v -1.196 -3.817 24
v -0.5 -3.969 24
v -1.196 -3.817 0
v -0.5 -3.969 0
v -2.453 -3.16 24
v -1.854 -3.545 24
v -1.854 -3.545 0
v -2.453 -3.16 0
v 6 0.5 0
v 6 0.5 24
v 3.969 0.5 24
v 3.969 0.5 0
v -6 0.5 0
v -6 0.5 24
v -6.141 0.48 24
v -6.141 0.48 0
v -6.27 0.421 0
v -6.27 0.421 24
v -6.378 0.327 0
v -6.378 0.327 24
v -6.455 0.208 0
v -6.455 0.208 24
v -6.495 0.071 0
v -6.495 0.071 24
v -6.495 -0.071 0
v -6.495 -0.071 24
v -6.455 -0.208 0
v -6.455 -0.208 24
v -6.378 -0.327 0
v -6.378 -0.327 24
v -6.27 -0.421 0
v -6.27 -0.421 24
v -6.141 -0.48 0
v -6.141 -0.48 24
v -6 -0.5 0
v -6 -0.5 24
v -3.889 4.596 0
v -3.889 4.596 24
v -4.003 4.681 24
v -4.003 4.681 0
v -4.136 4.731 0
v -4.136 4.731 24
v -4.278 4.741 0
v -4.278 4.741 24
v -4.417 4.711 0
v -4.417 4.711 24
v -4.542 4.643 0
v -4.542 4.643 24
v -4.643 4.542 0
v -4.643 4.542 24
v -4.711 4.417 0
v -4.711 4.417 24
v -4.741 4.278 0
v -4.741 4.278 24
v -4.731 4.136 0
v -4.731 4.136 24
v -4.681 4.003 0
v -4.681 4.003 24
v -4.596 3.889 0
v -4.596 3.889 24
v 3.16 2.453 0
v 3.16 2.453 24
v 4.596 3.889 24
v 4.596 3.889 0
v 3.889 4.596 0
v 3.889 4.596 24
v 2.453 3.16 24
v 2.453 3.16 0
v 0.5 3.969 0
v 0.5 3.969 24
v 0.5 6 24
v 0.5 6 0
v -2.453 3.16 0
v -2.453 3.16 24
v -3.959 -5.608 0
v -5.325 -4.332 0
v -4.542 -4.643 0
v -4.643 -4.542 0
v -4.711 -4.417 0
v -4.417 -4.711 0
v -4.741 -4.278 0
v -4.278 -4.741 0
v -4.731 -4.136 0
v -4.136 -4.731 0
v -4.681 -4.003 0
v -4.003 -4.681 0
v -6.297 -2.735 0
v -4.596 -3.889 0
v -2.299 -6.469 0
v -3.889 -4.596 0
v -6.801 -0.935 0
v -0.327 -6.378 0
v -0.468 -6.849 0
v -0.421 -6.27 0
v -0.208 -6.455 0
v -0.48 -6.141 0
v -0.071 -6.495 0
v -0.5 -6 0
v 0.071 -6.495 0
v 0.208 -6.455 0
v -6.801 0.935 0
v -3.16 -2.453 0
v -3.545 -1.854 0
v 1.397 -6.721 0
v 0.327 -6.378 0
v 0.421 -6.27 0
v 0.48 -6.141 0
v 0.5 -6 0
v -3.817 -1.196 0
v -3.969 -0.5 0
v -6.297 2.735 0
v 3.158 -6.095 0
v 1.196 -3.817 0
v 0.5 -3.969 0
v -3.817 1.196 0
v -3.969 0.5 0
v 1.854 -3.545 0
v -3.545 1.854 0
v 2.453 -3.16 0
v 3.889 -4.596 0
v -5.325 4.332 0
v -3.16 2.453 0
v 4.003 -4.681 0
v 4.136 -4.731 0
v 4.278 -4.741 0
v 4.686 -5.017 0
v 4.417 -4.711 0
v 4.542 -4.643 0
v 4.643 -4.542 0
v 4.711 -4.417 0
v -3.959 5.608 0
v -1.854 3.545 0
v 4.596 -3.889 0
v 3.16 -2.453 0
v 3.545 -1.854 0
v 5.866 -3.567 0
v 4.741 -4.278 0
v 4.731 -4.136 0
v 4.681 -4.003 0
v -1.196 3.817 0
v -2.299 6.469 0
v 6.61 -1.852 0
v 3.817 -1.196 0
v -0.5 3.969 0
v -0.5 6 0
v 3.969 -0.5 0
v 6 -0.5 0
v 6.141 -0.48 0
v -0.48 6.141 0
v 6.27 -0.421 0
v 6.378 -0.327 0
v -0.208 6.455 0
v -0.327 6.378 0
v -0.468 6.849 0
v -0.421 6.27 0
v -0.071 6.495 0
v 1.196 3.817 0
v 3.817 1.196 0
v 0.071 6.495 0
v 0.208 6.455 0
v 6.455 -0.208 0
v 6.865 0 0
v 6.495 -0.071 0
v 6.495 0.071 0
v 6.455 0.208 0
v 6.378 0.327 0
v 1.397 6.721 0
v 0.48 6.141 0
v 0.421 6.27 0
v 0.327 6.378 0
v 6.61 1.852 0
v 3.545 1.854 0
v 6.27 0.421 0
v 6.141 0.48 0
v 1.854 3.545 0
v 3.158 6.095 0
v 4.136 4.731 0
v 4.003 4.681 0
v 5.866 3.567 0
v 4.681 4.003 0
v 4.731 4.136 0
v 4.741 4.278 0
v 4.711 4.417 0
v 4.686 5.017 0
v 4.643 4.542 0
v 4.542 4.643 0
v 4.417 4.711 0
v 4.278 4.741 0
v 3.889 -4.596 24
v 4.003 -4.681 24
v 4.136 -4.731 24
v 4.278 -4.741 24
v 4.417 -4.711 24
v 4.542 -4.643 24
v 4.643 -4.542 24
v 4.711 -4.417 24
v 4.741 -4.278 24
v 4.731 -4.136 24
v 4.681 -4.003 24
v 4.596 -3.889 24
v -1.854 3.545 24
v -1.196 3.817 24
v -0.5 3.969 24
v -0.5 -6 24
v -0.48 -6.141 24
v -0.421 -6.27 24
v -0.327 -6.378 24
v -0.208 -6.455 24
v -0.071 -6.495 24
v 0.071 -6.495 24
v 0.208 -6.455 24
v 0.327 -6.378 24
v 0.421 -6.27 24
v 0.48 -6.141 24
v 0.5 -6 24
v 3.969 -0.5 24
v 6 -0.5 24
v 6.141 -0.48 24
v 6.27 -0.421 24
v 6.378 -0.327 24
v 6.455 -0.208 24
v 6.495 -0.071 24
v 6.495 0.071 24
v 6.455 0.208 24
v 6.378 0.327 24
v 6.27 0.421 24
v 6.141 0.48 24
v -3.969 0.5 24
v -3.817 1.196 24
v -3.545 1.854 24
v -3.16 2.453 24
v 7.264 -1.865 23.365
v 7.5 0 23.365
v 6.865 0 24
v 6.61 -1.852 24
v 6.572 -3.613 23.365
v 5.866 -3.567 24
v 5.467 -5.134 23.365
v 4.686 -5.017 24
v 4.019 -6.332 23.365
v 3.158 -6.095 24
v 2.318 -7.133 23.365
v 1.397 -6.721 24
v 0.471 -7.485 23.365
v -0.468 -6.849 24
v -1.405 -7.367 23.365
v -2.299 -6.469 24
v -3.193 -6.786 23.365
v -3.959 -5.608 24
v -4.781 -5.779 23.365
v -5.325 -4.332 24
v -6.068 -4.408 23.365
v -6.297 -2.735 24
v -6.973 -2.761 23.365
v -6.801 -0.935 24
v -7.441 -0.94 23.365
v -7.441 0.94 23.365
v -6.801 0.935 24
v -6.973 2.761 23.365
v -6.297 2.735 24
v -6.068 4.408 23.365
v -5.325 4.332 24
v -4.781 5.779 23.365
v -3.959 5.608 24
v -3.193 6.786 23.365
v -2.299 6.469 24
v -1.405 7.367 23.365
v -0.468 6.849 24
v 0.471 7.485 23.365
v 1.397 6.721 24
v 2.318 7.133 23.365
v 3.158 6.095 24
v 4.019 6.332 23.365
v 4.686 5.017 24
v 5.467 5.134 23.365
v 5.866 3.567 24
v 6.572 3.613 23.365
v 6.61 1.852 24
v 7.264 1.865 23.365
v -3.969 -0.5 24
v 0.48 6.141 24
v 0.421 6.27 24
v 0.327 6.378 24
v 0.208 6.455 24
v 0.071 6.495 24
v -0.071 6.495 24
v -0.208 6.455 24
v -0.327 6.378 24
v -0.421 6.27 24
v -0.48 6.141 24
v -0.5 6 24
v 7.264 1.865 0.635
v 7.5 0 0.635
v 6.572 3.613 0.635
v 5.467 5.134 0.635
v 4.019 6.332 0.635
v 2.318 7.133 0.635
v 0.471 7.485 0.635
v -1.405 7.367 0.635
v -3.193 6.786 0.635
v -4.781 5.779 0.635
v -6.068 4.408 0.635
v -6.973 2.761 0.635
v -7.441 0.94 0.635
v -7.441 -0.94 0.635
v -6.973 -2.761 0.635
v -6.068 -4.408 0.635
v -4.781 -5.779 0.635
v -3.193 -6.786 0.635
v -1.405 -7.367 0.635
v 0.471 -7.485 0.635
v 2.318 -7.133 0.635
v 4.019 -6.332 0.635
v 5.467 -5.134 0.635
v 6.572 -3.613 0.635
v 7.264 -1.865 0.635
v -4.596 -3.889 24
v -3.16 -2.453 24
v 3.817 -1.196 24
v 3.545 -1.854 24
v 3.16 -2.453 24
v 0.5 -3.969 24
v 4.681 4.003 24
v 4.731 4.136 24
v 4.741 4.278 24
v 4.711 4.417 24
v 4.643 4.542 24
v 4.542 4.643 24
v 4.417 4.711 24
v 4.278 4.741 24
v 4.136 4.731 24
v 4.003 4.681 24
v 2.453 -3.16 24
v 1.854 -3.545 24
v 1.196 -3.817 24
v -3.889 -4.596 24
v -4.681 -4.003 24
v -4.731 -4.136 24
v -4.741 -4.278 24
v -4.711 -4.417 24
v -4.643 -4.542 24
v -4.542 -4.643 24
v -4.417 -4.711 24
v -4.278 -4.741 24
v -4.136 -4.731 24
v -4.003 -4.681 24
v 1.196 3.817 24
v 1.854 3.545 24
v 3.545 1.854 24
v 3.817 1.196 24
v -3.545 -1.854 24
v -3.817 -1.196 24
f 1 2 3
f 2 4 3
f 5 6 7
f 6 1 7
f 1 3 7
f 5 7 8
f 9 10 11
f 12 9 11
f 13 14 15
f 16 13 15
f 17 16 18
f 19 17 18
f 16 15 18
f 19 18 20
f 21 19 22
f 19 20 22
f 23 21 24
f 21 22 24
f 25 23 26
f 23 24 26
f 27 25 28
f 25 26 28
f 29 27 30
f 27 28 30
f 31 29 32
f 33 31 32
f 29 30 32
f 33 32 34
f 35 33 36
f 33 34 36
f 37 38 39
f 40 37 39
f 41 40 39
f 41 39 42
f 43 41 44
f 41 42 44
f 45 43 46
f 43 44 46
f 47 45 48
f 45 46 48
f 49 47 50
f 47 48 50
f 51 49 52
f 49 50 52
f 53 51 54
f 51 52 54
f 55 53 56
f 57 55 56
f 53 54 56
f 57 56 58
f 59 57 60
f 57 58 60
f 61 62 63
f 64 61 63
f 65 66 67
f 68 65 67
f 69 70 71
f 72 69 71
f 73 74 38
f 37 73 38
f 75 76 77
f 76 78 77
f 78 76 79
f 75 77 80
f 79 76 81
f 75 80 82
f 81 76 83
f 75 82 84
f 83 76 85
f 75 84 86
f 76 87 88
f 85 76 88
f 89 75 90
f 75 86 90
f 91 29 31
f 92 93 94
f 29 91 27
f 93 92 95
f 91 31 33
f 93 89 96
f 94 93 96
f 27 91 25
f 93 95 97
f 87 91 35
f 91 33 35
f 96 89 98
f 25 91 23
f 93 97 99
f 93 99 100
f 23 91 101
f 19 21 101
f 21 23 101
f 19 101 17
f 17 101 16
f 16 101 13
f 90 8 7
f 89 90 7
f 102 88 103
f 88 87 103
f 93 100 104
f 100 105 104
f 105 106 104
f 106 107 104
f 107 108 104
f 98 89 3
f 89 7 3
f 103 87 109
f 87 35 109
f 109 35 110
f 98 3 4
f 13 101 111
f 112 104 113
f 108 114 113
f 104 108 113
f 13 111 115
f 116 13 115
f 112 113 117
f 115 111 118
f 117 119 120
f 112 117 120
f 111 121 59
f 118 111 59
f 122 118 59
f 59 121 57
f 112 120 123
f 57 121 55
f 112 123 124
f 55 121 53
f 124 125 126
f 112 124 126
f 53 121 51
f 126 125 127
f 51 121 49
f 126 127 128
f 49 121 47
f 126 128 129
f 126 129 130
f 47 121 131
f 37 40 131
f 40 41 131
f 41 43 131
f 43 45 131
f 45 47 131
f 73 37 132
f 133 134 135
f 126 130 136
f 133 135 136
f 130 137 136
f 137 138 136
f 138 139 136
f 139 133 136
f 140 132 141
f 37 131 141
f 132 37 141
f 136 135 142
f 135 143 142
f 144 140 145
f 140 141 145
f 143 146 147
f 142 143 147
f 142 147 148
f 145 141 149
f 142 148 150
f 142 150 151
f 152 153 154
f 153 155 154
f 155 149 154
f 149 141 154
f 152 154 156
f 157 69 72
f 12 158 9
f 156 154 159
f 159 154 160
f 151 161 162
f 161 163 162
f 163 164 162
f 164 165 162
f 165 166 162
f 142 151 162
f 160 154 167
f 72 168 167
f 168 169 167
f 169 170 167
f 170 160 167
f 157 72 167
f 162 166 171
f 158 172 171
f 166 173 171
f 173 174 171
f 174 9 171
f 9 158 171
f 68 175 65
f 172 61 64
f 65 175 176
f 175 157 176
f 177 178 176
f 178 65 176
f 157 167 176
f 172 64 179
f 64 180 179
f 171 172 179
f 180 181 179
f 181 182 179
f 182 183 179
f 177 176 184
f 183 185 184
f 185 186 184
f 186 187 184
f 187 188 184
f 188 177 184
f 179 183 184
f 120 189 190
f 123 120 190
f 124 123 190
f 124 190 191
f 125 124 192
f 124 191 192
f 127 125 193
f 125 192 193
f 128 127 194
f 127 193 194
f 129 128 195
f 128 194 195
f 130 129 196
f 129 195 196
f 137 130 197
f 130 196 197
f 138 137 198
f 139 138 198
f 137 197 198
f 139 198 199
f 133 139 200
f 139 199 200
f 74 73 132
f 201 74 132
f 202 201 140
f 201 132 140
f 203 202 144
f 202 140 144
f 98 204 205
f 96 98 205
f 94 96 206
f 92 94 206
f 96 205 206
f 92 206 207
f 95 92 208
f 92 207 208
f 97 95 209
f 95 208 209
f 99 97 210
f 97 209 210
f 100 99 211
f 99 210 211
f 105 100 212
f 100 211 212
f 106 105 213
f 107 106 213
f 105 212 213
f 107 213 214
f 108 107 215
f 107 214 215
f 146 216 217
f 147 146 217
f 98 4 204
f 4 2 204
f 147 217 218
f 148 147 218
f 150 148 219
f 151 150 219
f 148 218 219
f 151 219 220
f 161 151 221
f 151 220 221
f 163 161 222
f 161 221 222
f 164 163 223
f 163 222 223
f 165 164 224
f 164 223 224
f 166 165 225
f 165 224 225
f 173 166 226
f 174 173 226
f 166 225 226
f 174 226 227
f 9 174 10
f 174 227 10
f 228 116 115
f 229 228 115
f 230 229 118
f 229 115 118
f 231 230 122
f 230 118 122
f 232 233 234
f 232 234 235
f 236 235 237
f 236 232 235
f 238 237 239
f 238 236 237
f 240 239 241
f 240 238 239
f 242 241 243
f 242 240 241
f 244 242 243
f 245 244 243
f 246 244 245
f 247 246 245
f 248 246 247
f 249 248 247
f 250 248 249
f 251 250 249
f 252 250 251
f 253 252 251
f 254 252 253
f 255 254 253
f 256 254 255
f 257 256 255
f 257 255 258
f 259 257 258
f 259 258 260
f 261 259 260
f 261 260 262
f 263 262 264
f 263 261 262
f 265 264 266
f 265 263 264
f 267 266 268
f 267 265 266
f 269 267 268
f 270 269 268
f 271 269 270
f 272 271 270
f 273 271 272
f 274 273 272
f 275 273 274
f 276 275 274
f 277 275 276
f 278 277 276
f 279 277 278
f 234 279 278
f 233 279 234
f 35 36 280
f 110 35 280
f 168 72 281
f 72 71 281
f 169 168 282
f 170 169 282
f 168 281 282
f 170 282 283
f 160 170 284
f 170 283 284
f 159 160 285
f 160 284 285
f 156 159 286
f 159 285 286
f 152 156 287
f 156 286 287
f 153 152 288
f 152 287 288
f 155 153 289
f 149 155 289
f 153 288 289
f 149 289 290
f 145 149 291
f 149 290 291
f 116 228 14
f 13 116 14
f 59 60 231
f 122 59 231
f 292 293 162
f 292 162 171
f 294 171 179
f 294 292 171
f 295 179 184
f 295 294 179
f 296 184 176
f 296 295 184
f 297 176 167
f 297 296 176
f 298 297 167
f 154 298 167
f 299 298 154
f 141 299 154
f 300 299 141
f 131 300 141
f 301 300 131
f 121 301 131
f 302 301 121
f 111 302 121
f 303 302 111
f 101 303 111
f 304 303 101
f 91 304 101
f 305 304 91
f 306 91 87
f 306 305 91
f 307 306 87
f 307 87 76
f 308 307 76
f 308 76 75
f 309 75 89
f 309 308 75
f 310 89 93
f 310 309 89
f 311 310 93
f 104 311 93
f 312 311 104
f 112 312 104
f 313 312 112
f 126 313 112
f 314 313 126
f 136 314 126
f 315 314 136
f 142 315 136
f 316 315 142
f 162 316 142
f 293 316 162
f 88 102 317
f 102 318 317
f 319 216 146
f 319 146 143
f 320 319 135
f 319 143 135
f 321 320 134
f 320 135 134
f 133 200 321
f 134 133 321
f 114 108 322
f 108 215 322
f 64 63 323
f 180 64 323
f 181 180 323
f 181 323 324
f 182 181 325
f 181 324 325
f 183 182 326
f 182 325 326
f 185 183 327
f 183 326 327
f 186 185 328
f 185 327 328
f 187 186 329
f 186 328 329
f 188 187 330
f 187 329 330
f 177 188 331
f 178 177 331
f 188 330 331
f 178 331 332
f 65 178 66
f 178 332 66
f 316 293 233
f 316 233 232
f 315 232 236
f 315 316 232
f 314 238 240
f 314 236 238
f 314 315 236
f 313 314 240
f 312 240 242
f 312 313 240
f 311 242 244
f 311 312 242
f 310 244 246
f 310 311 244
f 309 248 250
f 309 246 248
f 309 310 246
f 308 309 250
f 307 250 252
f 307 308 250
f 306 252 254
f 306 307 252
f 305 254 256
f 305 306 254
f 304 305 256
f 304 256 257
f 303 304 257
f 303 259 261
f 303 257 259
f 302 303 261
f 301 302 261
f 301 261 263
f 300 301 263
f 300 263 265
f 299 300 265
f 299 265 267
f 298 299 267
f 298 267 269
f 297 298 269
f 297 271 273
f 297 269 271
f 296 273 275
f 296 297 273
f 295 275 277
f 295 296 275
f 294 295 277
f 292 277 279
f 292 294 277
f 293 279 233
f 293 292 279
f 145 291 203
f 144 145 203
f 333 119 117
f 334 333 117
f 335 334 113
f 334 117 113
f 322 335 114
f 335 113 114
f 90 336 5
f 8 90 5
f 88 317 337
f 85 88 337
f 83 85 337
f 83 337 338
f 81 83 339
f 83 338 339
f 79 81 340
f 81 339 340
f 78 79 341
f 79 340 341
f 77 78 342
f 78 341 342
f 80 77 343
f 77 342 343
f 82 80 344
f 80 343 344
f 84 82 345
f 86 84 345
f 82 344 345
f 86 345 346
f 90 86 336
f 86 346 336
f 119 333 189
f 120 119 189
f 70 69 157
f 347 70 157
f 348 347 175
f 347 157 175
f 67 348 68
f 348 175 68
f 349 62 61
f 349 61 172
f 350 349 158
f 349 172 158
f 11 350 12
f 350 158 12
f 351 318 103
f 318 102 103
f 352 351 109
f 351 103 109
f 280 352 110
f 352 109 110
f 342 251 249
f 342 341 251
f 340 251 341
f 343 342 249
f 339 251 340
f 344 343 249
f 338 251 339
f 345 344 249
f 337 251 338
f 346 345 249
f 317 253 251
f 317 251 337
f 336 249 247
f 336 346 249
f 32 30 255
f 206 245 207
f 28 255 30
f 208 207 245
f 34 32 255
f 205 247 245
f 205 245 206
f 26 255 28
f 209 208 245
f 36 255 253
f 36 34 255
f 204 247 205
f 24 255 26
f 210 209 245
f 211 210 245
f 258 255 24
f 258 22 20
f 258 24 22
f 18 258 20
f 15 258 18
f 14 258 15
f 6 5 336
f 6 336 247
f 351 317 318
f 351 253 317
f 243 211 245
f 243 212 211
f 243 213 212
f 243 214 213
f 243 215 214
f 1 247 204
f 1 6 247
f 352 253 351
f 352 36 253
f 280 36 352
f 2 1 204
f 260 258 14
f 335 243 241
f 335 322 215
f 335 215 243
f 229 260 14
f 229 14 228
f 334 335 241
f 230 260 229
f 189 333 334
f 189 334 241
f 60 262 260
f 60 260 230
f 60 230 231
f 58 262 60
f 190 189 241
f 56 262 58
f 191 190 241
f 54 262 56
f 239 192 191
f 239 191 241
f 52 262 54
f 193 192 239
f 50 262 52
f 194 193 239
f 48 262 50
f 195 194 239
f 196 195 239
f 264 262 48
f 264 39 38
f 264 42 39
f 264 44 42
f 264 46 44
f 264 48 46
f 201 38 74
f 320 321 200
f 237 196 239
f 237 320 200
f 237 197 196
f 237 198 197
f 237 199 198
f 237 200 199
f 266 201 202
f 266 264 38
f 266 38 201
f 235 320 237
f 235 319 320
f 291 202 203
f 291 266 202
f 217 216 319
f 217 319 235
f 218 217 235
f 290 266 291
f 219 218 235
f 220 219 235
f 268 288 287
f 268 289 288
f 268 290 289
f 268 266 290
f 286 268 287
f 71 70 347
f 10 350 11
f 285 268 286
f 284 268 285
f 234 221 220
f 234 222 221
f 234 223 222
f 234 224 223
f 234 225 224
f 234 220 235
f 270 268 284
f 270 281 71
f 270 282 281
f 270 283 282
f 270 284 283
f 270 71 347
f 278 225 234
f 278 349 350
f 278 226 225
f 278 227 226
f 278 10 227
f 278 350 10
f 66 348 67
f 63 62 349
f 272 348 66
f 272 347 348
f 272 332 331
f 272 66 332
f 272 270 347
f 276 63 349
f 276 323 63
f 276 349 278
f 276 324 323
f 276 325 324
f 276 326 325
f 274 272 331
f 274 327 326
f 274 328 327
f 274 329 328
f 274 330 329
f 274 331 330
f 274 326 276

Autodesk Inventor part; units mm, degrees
ref_plane "YZ Plane" through (0, 0, 0) normal (1, 0, 0) x (0, 1, 0)
ref_plane "XZ Plane" through (0, 0, 0) normal (0, 1, 0) x (-1, 0, 0)
ref_plane "XY Plane" through (0, 0, 0) normal (0, 0, 1) x (1, 0, 0)
sketch "Sketch1" plane through (0, 0, 0) normal (0, 0, 1) x (1, 0, 0)
  circle A0 centre (0, 0) radius 7.5
  circle A1 centre (0, 0) radius 4
  dimension "d0" = 15
  dimension "d1" = 8
extrude "Extrusion1" add sketch "Sketch1" along normal blind 24
sketch "Sketch2" plane through (0, 0, 24) normal (0, 0, 1) x (1, 0, 0)
  arc A0 (0.5, 6) -> (-0.5, 6) centre (0, 6) ccw
  line L0 (-0.5, 6) -> (-0.5, 2.6094)
  line L1 (-0.5, 2.6094) -> (0.5, 2.6094)
  line L2 (0.5, 2.6094) -> (0.5, 6)
  line L3 (-4.5962, 3.8891) -> (-2.1987, 1.4916)
  arc A1 (-3.8891, 4.5962) -> (-4.5962, 3.8891) centre (-4.2426, 4.2426) ccw
  line L4 (-1.4916, 2.1987) -> (-3.8891, 4.5962)
  line L5 (-2.1987, 1.4916) -> (-1.4916, 2.1987)
  line L6 (-6, -0.5) -> (-2.6094, -0.5)
  arc A2 (-6, 0.5) -> (-6, -0.5) centre (-6, 0) ccw
  line L7 (-2.6094, 0.5) -> (-6, 0.5)
  line L8 (-2.6094, -0.5) -> (-2.6094, 0.5)
  line L9 (-3.8891, -4.5962) -> (-1.4916, -2.1987)
  arc A3 (-4.5962, -3.8891) -> (-3.8891, -4.5962) centre (-4.2426, -4.2426) ccw
  line L10 (-2.1987, -1.4916) -> (-4.5962, -3.8891)
  line L11 (-1.4916, -2.1987) -> (-2.1987, -1.4916)
  line L12 (0.5, -6) -> (0.5, -2.6094)
  arc A4 (-0.5, -6) -> (0.5, -6) centre (0, -6) ccw
  line L13 (-0.5, -2.6094) -> (-0.5, -6)
  line L14 (0.5, -2.6094) -> (-0.5, -2.6094)
  line L15 (4.5962, -3.8891) -> (2.1987, -1.4916)
  arc A5 (3.8891, -4.5962) -> (4.5962, -3.8891) centre (4.2426, -4.2426) ccw
  line L16 (1.4916, -2.1987) -> (3.8891, -4.5962)
  line L17 (2.1987, -1.4916) -> (1.4916, -2.1987)
  line L18 (6, 0.5) -> (2.6094, 0.5)
  arc A6 (6, -0.5) -> (6, 0.5) centre (6, 0) ccw
  line L19 (2.6094, -0.5) -> (6, -0.5)
  line L20 (2.6094, 0.5) -> (2.6094, -0.5)
  line L21 (3.8891, 4.5962) -> (1.4916, 2.1987)
  arc A7 (4.5962, 3.8891) -> (3.8891, 4.5962) centre (4.2426, 4.2426) ccw
  line L22 (2.1987, 1.4916) -> (4.5962, 3.8891)
  line L23 (1.4916, 2.1987) -> (2.1987, 1.4916)
  point P0 (0, 0)
  dimension "d4" = 1
  dimension "d7" = 360
extrude "Extrusion2" cut sketch "Sketch2" against normal blind 24
chamfer "Chamfer1" distance 0.635 angle 45 2 edges at (-7.5, 0, 24) (-7.5, 0, 0)
properties part number "Dry Bearing"
